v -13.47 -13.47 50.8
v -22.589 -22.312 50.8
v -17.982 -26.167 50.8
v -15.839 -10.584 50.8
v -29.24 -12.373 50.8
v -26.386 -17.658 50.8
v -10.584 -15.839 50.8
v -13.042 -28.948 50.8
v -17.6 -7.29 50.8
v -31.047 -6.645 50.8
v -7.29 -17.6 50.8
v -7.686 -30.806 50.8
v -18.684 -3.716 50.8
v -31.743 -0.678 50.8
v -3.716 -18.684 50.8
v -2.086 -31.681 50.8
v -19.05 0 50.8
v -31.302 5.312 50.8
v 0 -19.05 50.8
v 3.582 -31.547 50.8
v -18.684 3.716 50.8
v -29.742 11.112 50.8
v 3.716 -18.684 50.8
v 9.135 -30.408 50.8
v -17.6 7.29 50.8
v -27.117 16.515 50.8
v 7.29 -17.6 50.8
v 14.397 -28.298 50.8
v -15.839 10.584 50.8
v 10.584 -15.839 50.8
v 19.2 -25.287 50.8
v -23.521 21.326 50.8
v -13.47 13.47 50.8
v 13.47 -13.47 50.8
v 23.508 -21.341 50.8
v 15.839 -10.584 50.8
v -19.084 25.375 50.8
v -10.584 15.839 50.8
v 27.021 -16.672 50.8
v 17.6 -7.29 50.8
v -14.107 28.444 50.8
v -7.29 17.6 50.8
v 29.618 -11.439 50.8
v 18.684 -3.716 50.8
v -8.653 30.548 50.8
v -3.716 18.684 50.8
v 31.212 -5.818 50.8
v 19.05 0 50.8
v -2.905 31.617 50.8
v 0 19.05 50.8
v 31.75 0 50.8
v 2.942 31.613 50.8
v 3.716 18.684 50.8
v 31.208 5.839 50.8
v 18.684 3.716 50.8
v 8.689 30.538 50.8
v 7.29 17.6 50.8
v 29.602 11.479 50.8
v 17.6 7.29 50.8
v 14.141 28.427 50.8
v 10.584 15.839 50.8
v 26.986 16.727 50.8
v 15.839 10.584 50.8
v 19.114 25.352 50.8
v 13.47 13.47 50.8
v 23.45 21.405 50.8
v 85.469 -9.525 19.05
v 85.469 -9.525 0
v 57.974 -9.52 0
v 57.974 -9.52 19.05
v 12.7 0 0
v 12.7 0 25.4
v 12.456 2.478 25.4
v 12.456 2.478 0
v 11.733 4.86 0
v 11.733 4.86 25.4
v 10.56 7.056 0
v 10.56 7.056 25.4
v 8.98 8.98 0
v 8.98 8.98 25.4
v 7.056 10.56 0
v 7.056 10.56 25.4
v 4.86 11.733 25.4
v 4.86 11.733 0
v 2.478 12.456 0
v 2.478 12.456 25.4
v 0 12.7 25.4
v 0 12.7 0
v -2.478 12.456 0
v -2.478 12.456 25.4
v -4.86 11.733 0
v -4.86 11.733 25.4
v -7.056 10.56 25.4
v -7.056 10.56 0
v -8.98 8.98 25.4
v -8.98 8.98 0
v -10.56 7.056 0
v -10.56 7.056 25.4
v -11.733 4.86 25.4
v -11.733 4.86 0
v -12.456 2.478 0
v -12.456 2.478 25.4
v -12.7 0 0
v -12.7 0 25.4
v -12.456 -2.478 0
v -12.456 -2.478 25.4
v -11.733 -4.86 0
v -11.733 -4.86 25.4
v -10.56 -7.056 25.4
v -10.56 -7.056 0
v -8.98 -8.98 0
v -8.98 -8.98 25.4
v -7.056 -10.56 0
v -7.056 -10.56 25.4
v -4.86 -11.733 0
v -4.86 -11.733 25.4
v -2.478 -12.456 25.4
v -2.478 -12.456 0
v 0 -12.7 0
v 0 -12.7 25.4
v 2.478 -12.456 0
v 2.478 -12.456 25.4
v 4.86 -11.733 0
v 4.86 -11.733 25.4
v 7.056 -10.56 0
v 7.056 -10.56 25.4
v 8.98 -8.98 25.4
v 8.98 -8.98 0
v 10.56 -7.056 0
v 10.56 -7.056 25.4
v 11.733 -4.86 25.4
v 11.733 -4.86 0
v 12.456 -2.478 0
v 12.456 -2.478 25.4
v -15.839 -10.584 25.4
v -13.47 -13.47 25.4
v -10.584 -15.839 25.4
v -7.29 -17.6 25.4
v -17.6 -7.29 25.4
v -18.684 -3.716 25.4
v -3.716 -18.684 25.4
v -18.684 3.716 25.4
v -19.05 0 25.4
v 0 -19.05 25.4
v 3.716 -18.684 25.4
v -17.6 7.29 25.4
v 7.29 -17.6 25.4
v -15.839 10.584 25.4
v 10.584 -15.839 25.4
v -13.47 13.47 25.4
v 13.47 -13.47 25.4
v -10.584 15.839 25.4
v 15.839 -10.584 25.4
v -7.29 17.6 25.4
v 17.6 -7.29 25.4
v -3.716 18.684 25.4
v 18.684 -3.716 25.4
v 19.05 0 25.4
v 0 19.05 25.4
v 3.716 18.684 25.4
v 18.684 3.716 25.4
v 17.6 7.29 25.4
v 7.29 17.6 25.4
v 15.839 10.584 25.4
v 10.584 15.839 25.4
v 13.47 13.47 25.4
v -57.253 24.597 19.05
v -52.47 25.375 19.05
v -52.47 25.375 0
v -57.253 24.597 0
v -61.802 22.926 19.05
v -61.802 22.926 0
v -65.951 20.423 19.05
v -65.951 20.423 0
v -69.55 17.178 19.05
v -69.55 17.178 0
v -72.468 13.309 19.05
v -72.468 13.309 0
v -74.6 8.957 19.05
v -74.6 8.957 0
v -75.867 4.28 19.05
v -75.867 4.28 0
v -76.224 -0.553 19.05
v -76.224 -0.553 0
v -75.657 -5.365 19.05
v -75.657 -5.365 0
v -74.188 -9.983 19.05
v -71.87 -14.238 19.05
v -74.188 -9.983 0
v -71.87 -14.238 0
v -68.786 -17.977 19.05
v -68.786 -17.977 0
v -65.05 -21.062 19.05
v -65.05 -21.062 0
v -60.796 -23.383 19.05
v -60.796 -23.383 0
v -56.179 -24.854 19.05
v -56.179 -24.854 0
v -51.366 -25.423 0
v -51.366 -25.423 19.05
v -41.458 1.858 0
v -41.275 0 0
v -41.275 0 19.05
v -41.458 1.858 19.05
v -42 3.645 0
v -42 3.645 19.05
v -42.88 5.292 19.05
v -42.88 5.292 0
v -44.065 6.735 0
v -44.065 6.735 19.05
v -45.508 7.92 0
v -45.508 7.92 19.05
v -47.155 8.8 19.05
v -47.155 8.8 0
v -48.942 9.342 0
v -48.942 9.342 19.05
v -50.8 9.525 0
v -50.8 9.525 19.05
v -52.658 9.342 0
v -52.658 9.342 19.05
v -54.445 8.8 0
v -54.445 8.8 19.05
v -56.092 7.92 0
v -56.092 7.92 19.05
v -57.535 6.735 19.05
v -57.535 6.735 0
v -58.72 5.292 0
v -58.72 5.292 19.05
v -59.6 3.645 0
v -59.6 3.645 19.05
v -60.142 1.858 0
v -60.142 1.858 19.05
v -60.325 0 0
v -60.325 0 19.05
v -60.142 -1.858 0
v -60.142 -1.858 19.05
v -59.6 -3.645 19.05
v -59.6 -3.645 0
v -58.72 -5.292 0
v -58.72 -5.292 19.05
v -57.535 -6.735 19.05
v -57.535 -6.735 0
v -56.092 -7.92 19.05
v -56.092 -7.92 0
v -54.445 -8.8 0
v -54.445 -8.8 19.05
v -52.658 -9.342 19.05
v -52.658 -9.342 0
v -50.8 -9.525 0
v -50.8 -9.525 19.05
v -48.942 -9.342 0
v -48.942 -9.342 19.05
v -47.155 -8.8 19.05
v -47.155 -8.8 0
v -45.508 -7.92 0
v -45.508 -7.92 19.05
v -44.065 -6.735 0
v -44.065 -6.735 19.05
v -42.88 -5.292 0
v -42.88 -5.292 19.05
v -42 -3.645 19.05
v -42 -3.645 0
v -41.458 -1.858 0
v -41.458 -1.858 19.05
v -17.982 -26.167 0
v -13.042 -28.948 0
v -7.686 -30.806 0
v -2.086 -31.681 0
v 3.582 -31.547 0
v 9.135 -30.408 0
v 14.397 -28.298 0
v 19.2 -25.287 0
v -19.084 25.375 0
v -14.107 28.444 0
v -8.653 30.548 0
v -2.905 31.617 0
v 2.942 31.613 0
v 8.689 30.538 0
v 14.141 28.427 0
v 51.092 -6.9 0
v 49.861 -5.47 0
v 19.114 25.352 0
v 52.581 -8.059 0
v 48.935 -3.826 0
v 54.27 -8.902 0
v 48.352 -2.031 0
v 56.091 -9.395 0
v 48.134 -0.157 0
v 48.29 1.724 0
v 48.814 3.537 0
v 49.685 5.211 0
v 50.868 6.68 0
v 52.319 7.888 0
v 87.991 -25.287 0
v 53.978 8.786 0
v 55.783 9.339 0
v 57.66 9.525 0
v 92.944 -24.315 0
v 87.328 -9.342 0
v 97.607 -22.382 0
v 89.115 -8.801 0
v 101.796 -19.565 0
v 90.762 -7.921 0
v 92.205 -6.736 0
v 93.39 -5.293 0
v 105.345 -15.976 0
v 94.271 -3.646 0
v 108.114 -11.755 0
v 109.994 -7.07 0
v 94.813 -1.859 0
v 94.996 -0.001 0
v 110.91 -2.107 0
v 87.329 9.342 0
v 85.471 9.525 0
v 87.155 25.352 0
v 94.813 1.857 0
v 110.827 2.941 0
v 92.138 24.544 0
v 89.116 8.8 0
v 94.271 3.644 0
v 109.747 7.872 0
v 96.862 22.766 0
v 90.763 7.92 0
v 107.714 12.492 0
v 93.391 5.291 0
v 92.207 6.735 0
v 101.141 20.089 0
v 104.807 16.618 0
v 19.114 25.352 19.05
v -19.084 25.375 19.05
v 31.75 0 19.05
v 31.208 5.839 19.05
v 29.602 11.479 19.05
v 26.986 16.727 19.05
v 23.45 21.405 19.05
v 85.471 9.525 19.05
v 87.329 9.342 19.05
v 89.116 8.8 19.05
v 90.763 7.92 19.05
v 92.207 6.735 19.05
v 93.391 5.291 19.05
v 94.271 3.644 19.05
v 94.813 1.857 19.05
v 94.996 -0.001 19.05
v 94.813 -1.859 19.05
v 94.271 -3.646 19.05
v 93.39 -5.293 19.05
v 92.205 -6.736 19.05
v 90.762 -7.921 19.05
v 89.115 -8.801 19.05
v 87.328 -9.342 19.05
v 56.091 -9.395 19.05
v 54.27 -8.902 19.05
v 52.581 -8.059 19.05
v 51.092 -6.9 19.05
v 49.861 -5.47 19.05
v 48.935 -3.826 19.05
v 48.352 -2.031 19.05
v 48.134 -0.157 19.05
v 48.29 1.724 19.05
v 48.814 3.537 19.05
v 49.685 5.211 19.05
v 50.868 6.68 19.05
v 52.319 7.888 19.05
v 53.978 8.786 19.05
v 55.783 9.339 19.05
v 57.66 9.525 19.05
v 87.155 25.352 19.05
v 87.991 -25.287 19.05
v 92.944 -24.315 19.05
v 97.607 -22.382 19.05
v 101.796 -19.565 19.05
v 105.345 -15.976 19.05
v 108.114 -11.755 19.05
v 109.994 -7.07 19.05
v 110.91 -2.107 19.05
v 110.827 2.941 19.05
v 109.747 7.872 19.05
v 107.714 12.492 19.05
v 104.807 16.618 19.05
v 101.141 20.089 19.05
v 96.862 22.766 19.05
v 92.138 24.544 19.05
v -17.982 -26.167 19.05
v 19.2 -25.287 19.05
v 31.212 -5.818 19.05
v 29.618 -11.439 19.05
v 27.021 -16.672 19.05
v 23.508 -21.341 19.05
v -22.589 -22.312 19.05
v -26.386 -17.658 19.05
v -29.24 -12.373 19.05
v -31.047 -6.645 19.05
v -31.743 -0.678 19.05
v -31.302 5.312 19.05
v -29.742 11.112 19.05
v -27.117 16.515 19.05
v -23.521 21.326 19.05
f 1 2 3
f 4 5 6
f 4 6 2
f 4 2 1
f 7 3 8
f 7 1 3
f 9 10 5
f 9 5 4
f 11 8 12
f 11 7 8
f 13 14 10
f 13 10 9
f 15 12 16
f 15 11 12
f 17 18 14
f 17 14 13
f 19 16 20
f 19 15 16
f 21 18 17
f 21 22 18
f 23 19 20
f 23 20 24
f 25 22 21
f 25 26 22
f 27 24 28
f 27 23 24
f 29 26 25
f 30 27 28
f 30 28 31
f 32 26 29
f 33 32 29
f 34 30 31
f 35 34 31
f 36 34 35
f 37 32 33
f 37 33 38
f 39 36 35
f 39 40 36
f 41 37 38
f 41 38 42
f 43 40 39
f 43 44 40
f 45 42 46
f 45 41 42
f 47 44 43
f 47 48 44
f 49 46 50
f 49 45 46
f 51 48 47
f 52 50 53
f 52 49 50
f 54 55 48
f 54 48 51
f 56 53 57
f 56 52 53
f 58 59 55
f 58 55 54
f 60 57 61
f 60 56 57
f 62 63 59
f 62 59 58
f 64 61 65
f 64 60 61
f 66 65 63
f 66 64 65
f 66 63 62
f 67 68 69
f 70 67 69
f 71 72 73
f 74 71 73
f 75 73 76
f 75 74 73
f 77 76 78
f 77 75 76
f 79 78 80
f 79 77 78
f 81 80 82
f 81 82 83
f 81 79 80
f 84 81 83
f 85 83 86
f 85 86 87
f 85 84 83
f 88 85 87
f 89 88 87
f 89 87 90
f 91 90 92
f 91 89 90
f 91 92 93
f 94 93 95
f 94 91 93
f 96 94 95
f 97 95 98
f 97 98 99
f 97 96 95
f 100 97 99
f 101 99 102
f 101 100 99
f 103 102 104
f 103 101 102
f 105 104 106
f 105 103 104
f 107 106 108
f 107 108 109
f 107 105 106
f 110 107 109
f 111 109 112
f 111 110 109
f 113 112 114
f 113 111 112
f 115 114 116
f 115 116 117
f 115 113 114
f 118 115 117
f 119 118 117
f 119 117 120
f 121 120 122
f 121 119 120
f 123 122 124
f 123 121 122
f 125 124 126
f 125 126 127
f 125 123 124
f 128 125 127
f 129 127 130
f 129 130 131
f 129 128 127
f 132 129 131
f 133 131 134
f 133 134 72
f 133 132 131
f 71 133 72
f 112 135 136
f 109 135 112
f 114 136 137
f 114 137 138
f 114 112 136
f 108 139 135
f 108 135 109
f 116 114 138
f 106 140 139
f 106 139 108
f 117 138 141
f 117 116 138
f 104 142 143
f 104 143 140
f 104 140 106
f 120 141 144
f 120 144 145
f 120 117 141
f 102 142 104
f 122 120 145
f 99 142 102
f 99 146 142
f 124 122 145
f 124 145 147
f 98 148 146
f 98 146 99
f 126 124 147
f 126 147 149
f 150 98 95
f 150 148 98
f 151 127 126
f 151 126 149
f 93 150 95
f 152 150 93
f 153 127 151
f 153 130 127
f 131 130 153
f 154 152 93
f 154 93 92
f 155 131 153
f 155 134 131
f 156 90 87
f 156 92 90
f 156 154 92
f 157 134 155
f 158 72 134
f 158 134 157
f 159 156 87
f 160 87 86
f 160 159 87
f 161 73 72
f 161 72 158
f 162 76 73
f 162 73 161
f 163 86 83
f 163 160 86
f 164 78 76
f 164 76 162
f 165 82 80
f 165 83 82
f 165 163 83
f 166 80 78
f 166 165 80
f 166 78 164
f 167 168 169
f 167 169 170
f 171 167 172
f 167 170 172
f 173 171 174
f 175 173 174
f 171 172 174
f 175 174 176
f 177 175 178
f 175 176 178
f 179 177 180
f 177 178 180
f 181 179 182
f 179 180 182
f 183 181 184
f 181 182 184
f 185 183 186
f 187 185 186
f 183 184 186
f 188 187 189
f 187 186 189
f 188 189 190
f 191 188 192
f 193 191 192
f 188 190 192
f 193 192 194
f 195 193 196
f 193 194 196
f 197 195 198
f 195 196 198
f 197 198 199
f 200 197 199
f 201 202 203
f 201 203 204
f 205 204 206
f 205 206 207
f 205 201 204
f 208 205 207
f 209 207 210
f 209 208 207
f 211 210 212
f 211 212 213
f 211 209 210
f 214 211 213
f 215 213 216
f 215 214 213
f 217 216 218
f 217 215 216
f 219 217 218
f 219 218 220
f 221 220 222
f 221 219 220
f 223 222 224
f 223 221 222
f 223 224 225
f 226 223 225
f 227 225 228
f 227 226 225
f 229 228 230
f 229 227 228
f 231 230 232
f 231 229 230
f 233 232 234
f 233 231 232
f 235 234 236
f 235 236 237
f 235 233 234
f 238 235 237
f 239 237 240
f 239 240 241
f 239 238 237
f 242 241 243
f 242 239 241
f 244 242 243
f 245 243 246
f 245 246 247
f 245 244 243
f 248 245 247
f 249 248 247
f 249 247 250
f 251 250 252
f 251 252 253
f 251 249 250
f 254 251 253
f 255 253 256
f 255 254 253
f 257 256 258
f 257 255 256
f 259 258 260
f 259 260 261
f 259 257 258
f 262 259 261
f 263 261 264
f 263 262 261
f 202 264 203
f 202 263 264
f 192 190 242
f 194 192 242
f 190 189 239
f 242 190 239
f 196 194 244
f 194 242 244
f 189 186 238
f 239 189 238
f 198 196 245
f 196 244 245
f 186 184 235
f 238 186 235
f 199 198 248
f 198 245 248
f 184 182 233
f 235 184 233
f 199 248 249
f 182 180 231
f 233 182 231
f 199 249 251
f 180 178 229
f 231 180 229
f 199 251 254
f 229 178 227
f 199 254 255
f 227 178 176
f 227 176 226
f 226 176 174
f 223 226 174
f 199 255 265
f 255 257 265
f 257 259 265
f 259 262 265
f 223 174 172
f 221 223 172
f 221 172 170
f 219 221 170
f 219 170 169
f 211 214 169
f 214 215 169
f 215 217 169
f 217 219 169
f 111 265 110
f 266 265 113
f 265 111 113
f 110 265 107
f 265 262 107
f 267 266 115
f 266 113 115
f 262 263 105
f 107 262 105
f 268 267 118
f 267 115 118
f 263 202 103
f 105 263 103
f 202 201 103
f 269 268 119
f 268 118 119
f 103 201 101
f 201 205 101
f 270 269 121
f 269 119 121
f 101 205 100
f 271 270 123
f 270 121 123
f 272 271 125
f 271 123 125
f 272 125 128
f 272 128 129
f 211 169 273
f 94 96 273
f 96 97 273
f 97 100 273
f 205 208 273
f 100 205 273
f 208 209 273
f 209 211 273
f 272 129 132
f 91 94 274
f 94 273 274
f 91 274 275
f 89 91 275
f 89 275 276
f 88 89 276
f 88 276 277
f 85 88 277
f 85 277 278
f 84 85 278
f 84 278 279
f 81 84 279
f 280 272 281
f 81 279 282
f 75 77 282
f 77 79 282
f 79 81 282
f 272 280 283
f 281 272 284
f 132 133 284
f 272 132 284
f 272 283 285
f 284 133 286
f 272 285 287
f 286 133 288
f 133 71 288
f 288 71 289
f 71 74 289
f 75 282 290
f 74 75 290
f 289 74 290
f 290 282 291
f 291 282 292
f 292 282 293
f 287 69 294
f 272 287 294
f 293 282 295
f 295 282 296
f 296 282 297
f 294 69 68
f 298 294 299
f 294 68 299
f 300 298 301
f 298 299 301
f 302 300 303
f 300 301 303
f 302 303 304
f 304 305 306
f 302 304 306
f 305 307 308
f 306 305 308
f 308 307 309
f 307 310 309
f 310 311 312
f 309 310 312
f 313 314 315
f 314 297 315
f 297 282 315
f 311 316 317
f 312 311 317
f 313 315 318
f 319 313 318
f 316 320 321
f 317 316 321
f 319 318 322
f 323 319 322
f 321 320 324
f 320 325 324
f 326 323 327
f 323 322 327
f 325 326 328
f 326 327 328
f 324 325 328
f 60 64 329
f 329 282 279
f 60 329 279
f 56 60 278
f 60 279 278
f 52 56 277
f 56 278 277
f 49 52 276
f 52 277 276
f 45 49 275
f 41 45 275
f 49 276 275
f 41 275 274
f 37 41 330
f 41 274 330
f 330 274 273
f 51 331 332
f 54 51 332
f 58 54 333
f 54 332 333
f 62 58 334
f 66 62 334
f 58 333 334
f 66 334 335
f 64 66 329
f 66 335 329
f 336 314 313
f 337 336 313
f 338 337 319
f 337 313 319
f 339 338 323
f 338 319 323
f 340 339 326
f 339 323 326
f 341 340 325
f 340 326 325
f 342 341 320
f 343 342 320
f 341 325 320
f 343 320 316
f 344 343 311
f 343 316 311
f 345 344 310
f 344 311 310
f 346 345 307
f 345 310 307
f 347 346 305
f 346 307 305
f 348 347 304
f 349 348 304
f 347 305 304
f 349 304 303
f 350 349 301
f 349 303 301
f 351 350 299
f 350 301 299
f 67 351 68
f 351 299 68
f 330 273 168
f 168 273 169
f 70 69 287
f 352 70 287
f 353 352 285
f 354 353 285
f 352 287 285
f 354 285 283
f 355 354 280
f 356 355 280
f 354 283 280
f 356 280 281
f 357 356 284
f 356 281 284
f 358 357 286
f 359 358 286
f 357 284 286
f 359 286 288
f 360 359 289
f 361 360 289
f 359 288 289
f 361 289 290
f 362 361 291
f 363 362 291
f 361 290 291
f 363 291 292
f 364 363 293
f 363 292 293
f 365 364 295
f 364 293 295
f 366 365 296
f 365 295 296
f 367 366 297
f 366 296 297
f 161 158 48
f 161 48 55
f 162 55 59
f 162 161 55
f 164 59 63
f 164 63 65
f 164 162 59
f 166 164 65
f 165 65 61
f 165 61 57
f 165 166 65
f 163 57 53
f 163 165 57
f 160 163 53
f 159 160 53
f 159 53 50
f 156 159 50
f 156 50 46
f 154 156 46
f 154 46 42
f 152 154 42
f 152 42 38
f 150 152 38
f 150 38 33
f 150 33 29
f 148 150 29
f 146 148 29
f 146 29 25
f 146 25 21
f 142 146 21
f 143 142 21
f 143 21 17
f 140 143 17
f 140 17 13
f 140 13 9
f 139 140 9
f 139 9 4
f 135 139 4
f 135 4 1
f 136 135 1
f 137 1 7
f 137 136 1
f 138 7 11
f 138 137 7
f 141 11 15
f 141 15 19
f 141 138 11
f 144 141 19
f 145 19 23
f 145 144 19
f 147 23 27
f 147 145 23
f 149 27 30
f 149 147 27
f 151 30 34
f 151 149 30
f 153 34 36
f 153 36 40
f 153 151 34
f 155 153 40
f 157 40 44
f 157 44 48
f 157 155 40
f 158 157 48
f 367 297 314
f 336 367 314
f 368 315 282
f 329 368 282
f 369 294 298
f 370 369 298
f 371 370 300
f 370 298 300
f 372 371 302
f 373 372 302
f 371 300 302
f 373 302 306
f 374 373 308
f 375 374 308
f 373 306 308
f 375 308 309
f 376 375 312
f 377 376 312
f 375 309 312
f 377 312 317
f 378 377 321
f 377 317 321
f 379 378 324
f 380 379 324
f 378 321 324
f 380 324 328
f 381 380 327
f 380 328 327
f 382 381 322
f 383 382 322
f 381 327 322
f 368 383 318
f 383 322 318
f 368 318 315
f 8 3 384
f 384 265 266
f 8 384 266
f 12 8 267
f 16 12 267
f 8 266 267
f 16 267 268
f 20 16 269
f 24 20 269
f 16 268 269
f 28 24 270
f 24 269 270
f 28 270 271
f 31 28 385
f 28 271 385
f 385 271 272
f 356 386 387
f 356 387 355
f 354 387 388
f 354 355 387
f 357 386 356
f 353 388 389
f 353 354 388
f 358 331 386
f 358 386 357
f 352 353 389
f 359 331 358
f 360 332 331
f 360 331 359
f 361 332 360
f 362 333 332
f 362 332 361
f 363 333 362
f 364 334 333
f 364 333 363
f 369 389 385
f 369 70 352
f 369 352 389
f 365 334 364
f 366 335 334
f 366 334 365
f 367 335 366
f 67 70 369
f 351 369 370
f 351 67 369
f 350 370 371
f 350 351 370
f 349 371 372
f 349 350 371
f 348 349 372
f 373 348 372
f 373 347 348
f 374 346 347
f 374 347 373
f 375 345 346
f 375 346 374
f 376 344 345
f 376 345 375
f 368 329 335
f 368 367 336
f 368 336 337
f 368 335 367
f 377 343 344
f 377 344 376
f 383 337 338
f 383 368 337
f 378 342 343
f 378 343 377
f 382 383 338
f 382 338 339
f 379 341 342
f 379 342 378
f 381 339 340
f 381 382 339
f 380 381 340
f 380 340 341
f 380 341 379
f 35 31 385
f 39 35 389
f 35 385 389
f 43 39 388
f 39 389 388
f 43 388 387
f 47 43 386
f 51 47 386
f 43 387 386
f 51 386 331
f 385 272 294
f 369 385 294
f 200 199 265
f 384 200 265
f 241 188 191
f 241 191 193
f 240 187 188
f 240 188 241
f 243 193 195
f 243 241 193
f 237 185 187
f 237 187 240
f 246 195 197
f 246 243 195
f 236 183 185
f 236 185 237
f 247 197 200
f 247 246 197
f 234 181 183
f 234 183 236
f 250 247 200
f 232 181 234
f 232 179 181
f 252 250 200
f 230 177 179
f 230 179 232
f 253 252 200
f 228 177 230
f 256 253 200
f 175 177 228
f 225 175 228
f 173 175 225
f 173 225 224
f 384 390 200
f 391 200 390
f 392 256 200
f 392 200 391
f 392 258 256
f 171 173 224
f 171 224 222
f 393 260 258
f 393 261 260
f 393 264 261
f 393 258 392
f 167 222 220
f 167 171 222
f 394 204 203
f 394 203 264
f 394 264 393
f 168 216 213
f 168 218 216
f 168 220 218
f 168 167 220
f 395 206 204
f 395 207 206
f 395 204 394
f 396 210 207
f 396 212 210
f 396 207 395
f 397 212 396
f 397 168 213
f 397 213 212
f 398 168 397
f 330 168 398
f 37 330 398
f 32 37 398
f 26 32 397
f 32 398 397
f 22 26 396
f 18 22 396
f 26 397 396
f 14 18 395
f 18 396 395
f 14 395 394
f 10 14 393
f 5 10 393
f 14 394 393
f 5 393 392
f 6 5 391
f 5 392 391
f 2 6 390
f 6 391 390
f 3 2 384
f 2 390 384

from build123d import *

# Parameters (mm, degrees)
F0_R     = 19.05
F1_DEPTH = 50.8
F0_R_2   = 9.525
F2_DEPTH = 19.05
F0_R_3   = 12.7
F3_DEPTH = 25.4


with BuildPart() as f1:
    # F0 (on Top) → F1 (new body)
    with BuildSketch(Plane.XY):
        with BuildLine():
            ThreePointArc((19.199675, -25.287052), (28.439868, -14.115113), (31.75, 0))
            ThreePointArc((31.75, 0), (28.415813, 14.163477), (19.113523, 25.352234))
            ThreePointArc((19.113523, 25.352234), (0.018633, 31.749995), (-19.083752, 25.374651))
            ThreePointArc((-19.083752, 25.374651), (-31.742751, -0.678404), (-17.982212, -26.166822))
            ThreePointArc((-17.982212, -26.166822), (0.751034, -31.741116), (19.199675, -25.287052))
        make_face()
        Circle(F0_R, mode=Mode.SUBTRACT)
    extrude(amount=F1_DEPTH)

    # F0 (on Top) → F2 (join)
    with BuildSketch(Plane.XY):
        with BuildLine():
            ThreePointArc((-17.982212, -26.166822), (-31.742751, -0.678404), (-19.083752, 25.374651))
            Line((-19.083752, 25.374651), (-49.129671, 25.374651))
            Line((-49.129671, 25.374651), (-52.470329, 25.374651))
            ThreePointArc((-52.470329, 25.374651), (-76.223563, -0.552574), (-51.36625, -25.423262))
            Line((-51.36625, -25.423262), (-17.982212, -26.166822))
        make_face()
        with Locations((-50.8, 0)):
            Circle(F0_R_2, mode=Mode.SUBTRACT)
        with BuildLine():
            ThreePointArc((19.113523, 25.352234), (28.415813, 14.163477), (31.75, 0))
            ThreePointArc((31.75, 0), (28.439868, -14.115113), (19.199675, -25.287052))
            Line((19.199675, -25.287052), (83.205302, -25.287052))
            Line((83.205302, -25.287052), (87.990698, -25.287052))
            ThreePointArc((87.990698, -25.287052), (110.994542, 0.419117), (87.155001, 25.352234))
            Line((87.155001, 25.352234), (84.040999, 25.352234))
            Line((84.040999, 25.352234), (19.113523, 25.352234))
        make_face()
        with BuildLine():
            ThreePointArc((85.471, 9.525), (94.996, -0.000908), (85.469184, -9.525))
            Line((85.469184, -9.525), (57.973988, -9.519757))
            ThreePointArc((57.973988, -9.519757), (48.134291, -0.156846), (57.660339, 9.525))
            Line((57.660339, 9.525), (85.471, 9.525))
        make_face(mode=Mode.SUBTRACT)
    extrude(amount=F2_DEPTH)

    # F0 (on Top) → F3 (join)
    with BuildSketch(Plane.XY):
        Circle(F0_R)
        Circle(F0_R_3, mode=Mode.SUBTRACT)
    extrude(amount=F3_DEPTH)


solid = f1.part
